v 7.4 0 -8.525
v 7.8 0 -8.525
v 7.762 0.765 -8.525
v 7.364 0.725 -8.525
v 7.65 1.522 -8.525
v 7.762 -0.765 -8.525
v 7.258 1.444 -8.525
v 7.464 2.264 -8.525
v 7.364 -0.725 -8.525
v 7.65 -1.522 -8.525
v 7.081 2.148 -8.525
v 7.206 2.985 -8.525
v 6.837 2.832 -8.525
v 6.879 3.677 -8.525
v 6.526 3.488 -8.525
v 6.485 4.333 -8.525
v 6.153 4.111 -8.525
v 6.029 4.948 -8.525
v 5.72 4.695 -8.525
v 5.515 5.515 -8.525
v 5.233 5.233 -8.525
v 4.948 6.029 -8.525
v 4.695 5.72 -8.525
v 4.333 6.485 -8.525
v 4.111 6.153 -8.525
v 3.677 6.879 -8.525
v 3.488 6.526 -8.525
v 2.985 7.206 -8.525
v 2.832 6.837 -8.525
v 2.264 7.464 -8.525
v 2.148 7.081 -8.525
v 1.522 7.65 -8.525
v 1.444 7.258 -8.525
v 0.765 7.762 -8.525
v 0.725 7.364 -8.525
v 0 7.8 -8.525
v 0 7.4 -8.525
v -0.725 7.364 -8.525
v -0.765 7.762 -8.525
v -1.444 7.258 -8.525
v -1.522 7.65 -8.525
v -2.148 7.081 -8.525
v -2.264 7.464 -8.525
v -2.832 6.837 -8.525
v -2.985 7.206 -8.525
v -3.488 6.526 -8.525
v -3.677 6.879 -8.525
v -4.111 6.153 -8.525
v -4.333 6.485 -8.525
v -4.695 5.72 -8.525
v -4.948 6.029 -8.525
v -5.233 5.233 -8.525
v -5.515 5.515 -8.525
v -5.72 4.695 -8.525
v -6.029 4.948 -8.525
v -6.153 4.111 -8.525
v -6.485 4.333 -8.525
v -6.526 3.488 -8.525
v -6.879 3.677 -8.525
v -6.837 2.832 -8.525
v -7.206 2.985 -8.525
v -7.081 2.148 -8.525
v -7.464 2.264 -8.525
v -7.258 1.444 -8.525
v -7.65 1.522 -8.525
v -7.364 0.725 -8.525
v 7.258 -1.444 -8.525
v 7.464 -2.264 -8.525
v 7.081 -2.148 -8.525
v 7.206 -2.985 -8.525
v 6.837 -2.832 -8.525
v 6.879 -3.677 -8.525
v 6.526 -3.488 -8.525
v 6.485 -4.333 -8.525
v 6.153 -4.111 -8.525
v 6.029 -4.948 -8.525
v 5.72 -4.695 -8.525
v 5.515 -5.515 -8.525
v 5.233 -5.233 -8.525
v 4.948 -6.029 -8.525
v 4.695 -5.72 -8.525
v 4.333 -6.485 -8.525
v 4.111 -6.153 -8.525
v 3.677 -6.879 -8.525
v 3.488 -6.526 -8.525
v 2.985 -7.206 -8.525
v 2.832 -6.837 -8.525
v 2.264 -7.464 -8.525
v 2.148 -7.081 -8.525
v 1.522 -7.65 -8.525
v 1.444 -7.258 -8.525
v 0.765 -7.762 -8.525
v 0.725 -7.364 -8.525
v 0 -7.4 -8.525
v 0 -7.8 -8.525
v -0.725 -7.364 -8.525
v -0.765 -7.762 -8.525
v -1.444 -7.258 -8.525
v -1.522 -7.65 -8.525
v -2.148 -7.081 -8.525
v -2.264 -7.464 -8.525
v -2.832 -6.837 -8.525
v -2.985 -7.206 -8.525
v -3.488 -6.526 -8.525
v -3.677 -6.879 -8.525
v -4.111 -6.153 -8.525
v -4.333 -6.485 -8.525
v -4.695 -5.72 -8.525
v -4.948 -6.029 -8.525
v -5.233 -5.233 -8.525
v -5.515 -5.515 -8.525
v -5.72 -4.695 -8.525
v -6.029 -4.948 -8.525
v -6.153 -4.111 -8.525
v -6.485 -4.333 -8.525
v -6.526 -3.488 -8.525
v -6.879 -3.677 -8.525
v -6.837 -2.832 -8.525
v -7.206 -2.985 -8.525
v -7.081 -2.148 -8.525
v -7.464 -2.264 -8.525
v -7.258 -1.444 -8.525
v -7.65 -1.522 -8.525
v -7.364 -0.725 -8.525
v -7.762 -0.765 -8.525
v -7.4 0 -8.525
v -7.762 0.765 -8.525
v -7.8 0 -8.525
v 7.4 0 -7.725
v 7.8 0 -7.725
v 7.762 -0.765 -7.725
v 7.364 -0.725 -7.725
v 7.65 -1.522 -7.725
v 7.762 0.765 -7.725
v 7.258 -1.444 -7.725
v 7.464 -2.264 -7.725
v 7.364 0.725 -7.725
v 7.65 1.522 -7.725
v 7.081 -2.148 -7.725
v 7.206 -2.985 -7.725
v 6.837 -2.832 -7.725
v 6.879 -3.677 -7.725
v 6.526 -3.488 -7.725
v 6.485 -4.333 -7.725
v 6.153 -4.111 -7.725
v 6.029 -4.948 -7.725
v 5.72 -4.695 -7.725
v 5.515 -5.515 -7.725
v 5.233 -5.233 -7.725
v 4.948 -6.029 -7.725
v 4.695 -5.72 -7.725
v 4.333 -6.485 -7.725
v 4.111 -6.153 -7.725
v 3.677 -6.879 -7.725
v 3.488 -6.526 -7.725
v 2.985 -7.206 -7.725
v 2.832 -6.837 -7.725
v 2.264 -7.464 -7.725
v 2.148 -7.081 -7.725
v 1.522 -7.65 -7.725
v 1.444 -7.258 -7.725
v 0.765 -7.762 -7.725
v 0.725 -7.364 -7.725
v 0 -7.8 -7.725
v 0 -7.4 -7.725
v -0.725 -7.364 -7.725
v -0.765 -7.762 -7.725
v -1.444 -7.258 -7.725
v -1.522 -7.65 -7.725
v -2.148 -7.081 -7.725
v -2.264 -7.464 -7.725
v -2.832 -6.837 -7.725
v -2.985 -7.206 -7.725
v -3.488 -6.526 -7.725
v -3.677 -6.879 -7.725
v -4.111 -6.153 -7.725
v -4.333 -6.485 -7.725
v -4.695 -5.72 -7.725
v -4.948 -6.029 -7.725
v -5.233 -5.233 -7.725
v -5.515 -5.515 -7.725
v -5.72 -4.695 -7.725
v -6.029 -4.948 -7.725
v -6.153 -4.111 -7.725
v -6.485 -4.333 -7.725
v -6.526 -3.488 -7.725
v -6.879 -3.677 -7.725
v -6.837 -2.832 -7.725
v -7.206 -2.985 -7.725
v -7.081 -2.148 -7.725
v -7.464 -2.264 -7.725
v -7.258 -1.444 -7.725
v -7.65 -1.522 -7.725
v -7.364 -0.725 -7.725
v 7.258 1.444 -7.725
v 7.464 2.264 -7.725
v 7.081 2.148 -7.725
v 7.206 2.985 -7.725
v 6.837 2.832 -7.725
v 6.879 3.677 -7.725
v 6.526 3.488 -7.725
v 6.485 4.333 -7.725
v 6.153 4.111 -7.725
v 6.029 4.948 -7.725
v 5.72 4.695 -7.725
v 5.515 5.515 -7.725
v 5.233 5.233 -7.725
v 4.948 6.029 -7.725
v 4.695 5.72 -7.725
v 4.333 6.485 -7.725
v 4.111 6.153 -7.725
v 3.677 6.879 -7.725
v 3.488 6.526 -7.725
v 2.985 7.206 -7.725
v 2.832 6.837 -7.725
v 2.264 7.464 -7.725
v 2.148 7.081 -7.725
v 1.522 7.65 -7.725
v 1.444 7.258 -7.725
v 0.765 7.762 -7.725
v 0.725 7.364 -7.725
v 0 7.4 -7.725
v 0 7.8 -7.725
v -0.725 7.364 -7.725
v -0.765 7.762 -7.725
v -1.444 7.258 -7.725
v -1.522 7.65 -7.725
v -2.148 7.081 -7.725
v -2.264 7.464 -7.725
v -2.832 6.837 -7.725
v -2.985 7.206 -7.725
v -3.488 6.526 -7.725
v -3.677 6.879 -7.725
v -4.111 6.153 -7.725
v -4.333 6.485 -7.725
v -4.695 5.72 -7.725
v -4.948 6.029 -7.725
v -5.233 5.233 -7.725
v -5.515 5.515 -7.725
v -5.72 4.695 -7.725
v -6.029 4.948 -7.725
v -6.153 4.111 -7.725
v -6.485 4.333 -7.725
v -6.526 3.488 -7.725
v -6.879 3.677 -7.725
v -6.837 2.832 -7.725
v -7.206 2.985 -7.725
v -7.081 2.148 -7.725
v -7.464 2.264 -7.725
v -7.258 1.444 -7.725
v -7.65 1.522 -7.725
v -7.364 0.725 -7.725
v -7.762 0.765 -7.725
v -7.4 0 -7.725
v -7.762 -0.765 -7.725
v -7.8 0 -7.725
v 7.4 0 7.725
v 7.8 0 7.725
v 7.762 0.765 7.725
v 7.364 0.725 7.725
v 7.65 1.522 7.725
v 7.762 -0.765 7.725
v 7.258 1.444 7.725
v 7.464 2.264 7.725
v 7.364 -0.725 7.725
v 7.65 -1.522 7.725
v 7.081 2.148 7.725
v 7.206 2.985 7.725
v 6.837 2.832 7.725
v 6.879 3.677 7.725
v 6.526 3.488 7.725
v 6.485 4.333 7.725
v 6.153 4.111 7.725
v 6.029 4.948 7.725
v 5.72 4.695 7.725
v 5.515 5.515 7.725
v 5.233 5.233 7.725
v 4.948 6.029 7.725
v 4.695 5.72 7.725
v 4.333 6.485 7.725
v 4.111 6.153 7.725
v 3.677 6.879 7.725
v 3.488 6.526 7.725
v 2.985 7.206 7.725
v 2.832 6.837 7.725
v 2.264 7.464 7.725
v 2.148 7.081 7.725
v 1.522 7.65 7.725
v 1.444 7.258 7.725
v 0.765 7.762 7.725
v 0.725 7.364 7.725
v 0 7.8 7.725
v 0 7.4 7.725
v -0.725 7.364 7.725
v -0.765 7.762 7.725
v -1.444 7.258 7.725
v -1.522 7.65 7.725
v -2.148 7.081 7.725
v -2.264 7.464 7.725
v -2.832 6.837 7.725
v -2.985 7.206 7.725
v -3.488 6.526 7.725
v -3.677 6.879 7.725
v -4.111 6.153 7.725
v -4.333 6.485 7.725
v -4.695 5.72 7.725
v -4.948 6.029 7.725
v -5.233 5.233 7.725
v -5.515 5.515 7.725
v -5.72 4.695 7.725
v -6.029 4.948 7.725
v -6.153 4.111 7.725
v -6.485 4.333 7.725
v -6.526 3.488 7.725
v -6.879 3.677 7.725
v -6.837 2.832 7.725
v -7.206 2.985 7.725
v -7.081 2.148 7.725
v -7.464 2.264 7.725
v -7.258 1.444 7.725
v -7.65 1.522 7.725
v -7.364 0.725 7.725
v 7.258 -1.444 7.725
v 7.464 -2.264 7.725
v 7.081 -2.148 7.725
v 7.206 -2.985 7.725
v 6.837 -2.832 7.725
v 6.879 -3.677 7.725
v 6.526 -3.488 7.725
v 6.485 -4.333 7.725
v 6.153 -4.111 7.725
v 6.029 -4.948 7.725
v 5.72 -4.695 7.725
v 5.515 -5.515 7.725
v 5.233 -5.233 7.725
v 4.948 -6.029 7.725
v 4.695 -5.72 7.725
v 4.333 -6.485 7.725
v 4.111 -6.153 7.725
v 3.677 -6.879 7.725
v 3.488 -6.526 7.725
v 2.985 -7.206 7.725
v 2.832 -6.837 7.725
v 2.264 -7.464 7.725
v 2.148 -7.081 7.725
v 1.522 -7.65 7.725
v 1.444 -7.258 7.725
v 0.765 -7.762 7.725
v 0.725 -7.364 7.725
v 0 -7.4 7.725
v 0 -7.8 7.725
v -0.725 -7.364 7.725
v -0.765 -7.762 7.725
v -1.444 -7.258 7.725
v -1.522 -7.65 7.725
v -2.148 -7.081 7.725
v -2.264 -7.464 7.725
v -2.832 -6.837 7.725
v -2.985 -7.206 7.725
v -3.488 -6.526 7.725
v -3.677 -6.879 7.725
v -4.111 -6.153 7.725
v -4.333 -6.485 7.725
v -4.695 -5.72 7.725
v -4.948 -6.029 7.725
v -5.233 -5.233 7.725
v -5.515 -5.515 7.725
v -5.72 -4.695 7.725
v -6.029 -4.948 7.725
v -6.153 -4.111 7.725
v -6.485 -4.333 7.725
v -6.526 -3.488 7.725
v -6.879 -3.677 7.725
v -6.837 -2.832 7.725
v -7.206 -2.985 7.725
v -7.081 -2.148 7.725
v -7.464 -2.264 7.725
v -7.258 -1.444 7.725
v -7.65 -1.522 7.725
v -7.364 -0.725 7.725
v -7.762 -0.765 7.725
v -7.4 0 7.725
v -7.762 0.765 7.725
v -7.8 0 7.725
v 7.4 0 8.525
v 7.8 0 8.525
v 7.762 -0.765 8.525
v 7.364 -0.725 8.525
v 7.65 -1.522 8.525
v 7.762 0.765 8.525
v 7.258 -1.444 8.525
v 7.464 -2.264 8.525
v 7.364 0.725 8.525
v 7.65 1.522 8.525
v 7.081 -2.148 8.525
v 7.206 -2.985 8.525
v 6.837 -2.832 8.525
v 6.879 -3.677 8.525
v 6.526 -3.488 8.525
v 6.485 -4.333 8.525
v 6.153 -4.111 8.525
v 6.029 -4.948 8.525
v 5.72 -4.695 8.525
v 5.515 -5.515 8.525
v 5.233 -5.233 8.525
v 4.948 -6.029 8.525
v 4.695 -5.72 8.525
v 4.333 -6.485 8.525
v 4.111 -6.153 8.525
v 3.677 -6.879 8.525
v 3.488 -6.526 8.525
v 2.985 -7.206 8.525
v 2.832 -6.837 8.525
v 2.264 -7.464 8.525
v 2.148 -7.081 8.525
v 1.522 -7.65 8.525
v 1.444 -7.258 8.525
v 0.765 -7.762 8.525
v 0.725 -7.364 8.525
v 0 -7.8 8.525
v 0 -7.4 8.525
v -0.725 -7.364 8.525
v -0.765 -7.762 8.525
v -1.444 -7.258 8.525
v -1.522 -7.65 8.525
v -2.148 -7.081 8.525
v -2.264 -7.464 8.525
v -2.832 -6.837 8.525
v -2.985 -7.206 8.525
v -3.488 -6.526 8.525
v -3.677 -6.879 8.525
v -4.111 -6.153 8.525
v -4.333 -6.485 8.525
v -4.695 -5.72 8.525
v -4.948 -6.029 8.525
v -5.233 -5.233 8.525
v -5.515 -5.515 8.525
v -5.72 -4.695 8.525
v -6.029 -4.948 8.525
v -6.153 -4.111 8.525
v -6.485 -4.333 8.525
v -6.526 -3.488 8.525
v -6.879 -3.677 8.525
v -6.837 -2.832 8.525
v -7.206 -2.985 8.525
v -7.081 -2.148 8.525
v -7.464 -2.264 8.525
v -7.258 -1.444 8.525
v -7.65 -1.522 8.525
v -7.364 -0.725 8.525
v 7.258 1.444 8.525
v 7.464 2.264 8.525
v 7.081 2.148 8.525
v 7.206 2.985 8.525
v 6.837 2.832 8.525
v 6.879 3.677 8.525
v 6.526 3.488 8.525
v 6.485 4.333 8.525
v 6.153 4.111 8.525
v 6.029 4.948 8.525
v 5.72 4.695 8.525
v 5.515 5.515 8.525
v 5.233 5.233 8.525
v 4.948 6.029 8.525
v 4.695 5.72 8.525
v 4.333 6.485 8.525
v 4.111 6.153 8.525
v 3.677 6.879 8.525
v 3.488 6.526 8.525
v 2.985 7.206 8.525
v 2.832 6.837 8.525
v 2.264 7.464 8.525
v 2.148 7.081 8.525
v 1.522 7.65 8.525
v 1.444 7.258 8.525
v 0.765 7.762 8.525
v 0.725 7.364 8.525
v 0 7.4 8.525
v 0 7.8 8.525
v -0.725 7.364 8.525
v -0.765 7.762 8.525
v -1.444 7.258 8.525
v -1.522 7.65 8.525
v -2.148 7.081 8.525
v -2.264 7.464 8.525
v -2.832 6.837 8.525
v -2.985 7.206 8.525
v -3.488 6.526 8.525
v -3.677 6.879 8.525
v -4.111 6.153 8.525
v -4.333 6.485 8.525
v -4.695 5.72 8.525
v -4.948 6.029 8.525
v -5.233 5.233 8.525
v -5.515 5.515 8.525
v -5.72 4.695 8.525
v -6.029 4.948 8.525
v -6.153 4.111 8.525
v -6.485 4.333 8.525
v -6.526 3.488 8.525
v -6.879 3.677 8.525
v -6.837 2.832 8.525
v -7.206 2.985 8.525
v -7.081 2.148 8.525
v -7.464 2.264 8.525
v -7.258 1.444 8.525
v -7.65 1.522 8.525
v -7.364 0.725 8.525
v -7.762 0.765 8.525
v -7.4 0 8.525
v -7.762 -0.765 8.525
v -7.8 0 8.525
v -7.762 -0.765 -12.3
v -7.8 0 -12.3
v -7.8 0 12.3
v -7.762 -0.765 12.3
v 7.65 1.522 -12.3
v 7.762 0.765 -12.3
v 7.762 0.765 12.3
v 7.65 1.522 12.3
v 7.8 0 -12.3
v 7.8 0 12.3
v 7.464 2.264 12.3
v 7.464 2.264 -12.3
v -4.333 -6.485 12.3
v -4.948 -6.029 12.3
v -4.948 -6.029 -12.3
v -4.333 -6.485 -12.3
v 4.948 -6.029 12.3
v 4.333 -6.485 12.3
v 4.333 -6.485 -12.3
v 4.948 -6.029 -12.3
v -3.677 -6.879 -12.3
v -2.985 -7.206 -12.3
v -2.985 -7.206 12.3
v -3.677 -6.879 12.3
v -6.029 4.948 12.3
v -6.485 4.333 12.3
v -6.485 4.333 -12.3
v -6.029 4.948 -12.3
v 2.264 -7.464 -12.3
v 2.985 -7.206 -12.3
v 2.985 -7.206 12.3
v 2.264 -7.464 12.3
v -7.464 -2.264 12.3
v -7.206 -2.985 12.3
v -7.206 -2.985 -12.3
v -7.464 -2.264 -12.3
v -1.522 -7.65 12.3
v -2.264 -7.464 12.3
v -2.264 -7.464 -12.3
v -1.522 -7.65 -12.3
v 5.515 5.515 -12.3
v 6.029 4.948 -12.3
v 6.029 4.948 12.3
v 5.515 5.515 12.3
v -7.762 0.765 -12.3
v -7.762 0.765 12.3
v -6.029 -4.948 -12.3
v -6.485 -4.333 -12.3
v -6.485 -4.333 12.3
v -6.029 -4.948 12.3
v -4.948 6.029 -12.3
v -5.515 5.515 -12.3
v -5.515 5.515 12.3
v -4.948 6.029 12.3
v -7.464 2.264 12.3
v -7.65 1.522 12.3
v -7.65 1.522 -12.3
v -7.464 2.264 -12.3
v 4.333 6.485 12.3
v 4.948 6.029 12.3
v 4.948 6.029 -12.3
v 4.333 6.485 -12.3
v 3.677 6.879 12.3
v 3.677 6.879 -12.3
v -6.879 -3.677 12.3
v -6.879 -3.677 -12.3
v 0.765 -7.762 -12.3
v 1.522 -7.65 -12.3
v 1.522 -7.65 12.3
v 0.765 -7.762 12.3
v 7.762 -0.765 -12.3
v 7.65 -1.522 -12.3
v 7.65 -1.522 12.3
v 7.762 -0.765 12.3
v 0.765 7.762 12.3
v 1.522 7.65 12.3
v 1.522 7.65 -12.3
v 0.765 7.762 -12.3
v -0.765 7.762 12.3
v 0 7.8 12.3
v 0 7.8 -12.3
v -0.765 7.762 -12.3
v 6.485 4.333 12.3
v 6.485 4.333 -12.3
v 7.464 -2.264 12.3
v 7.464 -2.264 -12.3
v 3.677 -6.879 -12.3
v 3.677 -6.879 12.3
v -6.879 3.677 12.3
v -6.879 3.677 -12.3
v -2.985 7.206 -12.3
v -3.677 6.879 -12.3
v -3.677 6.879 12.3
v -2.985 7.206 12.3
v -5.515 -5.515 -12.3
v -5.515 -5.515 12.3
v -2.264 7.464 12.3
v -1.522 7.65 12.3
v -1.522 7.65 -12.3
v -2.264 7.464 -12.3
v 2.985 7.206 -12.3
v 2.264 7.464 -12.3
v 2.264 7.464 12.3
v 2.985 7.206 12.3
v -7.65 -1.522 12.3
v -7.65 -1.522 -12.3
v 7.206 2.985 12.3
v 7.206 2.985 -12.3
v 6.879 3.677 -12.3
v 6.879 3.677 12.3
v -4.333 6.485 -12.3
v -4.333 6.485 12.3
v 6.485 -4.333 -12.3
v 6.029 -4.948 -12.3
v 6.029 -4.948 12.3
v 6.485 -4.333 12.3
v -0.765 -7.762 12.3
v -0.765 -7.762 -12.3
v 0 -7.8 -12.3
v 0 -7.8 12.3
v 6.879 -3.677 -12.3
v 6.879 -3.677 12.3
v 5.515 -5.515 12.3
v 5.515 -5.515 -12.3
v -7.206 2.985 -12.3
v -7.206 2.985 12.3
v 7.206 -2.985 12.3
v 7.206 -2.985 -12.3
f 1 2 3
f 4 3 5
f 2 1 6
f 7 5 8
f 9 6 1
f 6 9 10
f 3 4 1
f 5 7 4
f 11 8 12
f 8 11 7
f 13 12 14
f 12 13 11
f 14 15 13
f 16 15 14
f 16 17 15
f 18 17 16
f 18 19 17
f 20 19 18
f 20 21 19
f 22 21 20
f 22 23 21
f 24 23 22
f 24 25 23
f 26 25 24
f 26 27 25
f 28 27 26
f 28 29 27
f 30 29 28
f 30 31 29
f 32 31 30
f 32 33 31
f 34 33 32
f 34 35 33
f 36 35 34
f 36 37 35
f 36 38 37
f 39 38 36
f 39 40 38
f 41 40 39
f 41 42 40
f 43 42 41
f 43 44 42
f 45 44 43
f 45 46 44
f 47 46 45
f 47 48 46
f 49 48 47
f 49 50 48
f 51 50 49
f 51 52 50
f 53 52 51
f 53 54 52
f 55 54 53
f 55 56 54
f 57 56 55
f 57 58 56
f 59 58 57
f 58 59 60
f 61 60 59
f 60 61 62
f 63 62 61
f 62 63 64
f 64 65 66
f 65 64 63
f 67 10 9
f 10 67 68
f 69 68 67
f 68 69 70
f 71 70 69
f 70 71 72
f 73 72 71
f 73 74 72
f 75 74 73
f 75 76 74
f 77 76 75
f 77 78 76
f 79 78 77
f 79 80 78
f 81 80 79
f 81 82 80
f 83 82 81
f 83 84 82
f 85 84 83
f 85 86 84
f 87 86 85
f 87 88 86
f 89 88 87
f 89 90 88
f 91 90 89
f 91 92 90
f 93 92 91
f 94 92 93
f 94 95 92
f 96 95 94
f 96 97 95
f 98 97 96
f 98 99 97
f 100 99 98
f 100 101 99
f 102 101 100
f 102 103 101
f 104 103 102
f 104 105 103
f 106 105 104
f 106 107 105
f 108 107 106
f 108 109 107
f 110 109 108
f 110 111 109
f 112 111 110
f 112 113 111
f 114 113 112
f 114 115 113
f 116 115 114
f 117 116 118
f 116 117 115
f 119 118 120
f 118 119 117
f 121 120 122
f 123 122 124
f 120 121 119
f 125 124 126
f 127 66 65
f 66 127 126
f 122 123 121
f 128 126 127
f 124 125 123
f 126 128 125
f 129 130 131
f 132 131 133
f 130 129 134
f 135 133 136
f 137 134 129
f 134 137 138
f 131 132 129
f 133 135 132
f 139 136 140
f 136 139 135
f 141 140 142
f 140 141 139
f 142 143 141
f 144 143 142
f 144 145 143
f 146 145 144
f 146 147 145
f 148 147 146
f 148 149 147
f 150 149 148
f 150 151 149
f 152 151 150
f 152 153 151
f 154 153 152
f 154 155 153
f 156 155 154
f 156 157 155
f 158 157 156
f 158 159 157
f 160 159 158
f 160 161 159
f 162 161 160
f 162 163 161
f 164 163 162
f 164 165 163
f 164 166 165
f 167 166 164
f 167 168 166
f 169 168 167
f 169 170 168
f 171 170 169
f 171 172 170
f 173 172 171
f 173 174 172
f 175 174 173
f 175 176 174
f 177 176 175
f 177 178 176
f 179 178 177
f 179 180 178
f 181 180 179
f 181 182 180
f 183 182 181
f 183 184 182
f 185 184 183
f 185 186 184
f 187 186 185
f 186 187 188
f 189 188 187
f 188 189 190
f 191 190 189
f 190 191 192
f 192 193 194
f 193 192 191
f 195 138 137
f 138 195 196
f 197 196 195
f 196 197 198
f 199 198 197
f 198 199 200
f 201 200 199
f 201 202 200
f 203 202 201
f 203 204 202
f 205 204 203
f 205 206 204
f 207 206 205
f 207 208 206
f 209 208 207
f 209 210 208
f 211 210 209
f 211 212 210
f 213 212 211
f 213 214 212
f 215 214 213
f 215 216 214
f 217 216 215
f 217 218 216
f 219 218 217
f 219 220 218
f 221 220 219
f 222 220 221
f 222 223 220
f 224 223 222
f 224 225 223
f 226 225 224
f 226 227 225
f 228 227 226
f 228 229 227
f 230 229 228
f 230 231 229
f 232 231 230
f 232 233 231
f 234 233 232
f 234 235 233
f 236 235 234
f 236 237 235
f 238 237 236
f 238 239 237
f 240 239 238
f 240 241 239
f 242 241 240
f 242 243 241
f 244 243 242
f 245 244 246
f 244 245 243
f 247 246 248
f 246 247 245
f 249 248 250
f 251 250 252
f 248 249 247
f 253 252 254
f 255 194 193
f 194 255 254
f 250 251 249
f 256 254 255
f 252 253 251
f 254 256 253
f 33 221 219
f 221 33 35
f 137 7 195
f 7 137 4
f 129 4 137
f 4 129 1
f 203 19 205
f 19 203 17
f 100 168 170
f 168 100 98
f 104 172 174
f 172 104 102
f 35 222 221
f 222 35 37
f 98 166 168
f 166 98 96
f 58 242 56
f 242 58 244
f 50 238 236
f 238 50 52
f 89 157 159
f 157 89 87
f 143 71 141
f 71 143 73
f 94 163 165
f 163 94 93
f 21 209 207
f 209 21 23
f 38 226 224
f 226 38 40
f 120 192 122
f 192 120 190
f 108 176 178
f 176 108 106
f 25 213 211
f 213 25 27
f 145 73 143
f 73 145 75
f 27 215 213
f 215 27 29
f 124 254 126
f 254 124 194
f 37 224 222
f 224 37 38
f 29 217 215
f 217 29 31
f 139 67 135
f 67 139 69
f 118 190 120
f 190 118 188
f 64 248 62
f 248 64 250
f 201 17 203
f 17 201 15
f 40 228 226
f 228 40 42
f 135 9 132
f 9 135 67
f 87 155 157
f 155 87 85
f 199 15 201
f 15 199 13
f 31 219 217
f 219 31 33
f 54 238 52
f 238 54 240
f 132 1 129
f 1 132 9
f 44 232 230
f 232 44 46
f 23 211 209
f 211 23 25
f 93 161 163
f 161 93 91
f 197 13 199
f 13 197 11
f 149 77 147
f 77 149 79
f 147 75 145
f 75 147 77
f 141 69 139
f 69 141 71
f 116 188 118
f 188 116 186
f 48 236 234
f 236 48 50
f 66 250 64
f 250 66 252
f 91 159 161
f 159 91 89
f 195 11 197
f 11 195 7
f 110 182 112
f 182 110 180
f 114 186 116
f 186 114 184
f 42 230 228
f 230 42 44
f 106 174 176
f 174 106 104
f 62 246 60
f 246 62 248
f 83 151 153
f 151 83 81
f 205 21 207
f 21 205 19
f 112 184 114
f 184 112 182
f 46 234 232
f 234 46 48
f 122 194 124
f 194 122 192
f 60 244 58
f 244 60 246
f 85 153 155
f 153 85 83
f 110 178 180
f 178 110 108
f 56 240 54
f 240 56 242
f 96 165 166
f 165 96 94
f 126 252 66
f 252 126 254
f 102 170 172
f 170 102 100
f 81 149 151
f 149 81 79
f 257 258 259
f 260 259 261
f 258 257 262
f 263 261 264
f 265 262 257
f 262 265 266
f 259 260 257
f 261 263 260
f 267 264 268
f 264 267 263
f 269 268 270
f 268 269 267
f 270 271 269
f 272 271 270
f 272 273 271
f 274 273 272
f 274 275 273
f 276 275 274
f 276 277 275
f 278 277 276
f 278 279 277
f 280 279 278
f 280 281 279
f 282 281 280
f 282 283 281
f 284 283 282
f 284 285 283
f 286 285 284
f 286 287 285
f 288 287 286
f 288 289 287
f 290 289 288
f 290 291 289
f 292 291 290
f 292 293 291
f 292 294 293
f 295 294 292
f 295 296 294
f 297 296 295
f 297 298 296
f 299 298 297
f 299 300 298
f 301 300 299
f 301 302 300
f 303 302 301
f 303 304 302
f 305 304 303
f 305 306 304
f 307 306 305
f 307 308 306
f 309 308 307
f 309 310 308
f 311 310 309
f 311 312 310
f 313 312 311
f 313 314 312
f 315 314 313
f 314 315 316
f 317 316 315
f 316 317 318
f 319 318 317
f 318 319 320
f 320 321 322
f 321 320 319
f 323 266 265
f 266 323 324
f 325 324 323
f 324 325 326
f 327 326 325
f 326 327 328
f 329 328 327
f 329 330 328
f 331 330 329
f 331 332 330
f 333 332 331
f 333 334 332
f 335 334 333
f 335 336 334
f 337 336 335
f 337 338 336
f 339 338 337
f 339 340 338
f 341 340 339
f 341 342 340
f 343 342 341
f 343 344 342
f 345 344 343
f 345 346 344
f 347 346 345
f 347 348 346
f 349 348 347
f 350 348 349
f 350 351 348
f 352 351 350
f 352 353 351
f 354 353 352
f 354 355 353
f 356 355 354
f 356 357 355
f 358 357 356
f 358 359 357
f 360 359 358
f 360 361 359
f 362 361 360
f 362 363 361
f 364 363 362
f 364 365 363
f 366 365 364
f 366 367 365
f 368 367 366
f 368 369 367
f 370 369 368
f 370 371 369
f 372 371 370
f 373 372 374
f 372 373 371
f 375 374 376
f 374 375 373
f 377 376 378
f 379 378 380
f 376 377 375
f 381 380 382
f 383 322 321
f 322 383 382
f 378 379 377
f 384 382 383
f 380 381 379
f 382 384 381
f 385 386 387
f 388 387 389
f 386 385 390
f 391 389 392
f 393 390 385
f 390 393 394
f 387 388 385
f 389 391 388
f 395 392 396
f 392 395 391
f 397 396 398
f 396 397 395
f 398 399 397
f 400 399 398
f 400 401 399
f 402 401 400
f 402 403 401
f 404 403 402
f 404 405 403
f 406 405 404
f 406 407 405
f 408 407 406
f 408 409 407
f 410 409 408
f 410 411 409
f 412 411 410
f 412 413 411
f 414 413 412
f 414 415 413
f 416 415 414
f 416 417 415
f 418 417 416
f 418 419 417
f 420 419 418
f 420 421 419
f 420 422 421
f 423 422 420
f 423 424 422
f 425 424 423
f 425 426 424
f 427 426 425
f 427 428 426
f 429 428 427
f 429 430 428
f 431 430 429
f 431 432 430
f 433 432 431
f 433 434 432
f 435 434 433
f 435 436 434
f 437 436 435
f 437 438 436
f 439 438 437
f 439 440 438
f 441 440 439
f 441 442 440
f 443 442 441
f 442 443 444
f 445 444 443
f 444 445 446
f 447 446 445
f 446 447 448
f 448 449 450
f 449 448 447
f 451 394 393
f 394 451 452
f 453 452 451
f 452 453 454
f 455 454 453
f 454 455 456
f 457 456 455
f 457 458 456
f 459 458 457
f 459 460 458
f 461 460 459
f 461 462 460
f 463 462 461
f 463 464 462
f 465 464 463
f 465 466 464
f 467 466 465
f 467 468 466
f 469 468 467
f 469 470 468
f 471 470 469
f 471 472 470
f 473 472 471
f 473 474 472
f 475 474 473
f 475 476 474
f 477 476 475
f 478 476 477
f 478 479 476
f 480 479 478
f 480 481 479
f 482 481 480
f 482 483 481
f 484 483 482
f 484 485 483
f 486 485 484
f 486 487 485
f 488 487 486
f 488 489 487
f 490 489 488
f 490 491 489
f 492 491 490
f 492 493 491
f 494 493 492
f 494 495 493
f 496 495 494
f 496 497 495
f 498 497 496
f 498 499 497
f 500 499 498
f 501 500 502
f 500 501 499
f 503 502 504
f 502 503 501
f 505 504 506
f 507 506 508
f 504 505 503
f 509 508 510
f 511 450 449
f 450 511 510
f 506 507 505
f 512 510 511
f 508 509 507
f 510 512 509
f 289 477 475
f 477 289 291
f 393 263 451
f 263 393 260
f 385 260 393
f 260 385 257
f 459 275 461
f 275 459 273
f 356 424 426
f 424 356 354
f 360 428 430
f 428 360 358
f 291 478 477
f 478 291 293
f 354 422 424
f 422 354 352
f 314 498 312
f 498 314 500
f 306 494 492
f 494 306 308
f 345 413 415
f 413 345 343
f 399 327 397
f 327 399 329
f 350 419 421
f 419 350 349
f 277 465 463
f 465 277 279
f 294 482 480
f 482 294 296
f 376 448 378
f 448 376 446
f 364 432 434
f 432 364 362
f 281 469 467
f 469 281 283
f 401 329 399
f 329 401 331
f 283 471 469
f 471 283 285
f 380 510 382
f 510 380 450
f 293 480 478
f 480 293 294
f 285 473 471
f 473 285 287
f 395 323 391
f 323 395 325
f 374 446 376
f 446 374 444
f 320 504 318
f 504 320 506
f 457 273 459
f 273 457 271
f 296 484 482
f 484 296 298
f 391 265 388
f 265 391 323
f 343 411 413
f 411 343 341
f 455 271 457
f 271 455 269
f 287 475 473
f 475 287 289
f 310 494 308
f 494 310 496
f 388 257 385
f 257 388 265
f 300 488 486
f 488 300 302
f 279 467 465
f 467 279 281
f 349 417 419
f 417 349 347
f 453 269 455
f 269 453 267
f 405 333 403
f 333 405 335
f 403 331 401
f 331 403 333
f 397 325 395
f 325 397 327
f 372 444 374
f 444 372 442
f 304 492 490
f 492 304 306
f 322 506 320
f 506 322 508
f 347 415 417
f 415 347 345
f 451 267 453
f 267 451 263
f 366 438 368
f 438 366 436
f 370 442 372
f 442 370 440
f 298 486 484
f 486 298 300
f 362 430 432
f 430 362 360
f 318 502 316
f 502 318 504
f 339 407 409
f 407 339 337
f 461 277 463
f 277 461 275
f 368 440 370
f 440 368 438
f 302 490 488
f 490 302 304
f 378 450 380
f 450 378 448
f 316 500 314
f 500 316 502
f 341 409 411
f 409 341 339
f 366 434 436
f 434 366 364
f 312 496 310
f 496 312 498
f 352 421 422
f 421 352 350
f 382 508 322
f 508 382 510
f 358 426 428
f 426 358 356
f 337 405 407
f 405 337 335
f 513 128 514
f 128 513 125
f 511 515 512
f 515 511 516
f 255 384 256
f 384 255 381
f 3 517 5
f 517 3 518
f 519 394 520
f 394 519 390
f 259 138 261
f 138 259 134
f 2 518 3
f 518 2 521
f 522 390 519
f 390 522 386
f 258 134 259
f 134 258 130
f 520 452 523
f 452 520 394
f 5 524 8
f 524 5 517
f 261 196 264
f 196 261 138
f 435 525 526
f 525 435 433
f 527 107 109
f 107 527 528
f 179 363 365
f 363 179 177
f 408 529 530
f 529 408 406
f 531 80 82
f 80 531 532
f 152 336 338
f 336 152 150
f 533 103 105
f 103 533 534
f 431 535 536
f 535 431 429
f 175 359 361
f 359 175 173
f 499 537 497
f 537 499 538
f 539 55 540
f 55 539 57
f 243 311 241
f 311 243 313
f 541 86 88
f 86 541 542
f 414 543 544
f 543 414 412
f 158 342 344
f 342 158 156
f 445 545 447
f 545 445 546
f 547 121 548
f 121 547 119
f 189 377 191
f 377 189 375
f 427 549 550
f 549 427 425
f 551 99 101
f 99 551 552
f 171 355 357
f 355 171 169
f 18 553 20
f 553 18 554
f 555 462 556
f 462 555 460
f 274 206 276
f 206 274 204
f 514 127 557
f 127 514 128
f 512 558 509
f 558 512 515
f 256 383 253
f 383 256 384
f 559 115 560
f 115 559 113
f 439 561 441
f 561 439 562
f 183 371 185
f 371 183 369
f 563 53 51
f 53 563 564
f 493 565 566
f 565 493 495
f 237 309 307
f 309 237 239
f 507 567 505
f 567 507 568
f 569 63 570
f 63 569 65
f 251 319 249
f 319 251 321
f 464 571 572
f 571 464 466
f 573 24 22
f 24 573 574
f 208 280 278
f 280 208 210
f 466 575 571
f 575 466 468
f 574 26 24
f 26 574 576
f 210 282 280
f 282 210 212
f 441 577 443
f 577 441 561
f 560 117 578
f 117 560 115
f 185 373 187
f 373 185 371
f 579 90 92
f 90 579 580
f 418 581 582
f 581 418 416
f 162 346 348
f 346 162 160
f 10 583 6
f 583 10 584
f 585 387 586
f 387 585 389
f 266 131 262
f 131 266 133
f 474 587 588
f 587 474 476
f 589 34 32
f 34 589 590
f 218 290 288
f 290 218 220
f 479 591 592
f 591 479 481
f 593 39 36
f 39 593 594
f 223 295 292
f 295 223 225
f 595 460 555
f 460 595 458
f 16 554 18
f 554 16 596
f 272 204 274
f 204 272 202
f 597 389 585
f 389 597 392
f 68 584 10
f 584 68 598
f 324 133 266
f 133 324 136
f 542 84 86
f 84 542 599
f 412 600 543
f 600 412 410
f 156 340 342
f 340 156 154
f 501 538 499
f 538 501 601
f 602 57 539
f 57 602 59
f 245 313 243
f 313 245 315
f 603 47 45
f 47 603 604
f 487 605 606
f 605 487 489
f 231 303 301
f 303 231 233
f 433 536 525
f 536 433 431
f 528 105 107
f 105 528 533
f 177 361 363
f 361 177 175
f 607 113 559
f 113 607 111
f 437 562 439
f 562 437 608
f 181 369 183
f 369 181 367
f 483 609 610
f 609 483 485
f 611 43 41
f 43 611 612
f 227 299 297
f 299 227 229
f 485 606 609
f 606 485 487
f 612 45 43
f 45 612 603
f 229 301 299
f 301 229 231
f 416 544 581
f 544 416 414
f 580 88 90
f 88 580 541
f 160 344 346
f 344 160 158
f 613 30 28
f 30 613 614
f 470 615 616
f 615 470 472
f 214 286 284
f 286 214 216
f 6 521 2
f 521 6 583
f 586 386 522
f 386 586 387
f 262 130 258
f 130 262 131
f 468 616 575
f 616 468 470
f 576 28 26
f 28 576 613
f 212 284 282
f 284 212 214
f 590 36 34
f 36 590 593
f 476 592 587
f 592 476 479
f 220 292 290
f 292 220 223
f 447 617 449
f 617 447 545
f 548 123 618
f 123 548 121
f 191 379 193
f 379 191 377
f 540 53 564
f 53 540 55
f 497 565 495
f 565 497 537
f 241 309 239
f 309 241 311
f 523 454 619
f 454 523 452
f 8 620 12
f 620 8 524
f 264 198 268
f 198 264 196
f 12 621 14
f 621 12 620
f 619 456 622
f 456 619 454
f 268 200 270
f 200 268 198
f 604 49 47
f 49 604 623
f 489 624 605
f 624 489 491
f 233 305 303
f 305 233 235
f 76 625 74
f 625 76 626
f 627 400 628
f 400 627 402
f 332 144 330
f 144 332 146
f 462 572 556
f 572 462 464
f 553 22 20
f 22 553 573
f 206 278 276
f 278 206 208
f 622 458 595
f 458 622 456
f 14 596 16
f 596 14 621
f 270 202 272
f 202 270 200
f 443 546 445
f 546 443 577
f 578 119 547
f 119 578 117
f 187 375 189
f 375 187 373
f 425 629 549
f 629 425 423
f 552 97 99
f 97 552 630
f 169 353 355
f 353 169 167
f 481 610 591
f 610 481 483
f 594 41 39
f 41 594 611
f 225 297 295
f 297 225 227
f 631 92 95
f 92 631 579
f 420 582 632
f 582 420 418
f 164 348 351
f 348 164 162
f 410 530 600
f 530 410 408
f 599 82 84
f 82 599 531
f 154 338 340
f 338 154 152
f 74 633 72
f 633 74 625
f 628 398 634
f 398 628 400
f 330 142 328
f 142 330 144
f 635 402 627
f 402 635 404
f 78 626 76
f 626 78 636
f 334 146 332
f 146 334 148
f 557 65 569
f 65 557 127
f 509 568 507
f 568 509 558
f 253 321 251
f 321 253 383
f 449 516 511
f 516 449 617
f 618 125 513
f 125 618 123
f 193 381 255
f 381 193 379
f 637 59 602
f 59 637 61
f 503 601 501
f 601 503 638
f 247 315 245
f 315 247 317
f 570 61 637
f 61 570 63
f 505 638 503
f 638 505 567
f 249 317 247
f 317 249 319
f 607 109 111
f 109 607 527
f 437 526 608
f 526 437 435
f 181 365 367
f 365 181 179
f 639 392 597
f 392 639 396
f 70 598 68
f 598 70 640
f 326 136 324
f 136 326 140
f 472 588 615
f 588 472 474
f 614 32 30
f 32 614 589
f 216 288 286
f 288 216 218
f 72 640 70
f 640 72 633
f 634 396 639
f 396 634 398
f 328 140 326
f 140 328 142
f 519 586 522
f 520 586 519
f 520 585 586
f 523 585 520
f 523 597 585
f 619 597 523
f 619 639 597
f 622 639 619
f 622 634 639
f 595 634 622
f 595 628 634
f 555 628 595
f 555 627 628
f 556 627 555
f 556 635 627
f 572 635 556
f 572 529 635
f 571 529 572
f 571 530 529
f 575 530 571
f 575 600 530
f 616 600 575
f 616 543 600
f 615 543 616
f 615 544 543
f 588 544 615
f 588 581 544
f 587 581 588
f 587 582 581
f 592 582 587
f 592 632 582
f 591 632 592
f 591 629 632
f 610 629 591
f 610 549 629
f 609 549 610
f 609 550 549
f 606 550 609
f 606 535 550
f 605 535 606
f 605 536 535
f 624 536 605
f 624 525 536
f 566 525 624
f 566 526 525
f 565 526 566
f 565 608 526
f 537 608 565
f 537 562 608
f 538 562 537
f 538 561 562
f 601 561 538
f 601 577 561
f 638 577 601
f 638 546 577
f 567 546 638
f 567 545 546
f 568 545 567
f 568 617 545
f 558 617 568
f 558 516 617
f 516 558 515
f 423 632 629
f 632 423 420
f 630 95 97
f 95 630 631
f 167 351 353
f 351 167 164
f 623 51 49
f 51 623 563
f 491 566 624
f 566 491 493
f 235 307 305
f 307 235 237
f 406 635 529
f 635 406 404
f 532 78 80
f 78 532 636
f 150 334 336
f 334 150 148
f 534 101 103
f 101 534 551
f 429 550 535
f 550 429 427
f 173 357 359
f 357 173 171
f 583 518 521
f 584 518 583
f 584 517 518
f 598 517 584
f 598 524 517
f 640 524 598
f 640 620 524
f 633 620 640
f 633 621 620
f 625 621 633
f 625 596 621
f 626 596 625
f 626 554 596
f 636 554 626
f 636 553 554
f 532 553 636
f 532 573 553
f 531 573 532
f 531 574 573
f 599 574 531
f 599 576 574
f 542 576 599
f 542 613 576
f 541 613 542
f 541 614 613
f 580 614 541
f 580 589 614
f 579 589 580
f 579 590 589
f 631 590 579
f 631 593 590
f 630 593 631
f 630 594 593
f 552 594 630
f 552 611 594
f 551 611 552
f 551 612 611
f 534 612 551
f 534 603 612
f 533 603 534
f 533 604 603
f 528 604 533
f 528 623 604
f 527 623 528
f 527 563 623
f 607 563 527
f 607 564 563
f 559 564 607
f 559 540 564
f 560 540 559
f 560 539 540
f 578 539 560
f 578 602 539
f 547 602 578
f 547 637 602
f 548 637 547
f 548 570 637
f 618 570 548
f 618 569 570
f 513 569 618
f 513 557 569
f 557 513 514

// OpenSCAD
LM8UU();


module LM8UU()
{
	_LinearBallBearing(15.6,24.6,0.8,0.4, 16.25);
}

module _LinearBallBearing(	diameter,
                            height,
                            groove_width,
                            groove_depth,
                            groove_distance)
{
	difference()
	{
		cylinder(d=diameter, h=height, $fn=64, center=true);
		union()
		{
			translate([0,0,-groove_distance*0.5])
			_Ring(diameter+0.1, diameter-2*groove_depth, groove_width);
			translate([0,0,groove_distance*0.5])
			_Ring(diameter+0.1, diameter-2*groove_depth, groove_width);
		}
	}
}

module _Ring(outer, inner, height)
{
	difference()
	{
		cylinder(d=outer, h=height, $fn=64, center=true);
		cylinder(d=inner, h=height+0.1, $fn=64, center=true);
	}
}
